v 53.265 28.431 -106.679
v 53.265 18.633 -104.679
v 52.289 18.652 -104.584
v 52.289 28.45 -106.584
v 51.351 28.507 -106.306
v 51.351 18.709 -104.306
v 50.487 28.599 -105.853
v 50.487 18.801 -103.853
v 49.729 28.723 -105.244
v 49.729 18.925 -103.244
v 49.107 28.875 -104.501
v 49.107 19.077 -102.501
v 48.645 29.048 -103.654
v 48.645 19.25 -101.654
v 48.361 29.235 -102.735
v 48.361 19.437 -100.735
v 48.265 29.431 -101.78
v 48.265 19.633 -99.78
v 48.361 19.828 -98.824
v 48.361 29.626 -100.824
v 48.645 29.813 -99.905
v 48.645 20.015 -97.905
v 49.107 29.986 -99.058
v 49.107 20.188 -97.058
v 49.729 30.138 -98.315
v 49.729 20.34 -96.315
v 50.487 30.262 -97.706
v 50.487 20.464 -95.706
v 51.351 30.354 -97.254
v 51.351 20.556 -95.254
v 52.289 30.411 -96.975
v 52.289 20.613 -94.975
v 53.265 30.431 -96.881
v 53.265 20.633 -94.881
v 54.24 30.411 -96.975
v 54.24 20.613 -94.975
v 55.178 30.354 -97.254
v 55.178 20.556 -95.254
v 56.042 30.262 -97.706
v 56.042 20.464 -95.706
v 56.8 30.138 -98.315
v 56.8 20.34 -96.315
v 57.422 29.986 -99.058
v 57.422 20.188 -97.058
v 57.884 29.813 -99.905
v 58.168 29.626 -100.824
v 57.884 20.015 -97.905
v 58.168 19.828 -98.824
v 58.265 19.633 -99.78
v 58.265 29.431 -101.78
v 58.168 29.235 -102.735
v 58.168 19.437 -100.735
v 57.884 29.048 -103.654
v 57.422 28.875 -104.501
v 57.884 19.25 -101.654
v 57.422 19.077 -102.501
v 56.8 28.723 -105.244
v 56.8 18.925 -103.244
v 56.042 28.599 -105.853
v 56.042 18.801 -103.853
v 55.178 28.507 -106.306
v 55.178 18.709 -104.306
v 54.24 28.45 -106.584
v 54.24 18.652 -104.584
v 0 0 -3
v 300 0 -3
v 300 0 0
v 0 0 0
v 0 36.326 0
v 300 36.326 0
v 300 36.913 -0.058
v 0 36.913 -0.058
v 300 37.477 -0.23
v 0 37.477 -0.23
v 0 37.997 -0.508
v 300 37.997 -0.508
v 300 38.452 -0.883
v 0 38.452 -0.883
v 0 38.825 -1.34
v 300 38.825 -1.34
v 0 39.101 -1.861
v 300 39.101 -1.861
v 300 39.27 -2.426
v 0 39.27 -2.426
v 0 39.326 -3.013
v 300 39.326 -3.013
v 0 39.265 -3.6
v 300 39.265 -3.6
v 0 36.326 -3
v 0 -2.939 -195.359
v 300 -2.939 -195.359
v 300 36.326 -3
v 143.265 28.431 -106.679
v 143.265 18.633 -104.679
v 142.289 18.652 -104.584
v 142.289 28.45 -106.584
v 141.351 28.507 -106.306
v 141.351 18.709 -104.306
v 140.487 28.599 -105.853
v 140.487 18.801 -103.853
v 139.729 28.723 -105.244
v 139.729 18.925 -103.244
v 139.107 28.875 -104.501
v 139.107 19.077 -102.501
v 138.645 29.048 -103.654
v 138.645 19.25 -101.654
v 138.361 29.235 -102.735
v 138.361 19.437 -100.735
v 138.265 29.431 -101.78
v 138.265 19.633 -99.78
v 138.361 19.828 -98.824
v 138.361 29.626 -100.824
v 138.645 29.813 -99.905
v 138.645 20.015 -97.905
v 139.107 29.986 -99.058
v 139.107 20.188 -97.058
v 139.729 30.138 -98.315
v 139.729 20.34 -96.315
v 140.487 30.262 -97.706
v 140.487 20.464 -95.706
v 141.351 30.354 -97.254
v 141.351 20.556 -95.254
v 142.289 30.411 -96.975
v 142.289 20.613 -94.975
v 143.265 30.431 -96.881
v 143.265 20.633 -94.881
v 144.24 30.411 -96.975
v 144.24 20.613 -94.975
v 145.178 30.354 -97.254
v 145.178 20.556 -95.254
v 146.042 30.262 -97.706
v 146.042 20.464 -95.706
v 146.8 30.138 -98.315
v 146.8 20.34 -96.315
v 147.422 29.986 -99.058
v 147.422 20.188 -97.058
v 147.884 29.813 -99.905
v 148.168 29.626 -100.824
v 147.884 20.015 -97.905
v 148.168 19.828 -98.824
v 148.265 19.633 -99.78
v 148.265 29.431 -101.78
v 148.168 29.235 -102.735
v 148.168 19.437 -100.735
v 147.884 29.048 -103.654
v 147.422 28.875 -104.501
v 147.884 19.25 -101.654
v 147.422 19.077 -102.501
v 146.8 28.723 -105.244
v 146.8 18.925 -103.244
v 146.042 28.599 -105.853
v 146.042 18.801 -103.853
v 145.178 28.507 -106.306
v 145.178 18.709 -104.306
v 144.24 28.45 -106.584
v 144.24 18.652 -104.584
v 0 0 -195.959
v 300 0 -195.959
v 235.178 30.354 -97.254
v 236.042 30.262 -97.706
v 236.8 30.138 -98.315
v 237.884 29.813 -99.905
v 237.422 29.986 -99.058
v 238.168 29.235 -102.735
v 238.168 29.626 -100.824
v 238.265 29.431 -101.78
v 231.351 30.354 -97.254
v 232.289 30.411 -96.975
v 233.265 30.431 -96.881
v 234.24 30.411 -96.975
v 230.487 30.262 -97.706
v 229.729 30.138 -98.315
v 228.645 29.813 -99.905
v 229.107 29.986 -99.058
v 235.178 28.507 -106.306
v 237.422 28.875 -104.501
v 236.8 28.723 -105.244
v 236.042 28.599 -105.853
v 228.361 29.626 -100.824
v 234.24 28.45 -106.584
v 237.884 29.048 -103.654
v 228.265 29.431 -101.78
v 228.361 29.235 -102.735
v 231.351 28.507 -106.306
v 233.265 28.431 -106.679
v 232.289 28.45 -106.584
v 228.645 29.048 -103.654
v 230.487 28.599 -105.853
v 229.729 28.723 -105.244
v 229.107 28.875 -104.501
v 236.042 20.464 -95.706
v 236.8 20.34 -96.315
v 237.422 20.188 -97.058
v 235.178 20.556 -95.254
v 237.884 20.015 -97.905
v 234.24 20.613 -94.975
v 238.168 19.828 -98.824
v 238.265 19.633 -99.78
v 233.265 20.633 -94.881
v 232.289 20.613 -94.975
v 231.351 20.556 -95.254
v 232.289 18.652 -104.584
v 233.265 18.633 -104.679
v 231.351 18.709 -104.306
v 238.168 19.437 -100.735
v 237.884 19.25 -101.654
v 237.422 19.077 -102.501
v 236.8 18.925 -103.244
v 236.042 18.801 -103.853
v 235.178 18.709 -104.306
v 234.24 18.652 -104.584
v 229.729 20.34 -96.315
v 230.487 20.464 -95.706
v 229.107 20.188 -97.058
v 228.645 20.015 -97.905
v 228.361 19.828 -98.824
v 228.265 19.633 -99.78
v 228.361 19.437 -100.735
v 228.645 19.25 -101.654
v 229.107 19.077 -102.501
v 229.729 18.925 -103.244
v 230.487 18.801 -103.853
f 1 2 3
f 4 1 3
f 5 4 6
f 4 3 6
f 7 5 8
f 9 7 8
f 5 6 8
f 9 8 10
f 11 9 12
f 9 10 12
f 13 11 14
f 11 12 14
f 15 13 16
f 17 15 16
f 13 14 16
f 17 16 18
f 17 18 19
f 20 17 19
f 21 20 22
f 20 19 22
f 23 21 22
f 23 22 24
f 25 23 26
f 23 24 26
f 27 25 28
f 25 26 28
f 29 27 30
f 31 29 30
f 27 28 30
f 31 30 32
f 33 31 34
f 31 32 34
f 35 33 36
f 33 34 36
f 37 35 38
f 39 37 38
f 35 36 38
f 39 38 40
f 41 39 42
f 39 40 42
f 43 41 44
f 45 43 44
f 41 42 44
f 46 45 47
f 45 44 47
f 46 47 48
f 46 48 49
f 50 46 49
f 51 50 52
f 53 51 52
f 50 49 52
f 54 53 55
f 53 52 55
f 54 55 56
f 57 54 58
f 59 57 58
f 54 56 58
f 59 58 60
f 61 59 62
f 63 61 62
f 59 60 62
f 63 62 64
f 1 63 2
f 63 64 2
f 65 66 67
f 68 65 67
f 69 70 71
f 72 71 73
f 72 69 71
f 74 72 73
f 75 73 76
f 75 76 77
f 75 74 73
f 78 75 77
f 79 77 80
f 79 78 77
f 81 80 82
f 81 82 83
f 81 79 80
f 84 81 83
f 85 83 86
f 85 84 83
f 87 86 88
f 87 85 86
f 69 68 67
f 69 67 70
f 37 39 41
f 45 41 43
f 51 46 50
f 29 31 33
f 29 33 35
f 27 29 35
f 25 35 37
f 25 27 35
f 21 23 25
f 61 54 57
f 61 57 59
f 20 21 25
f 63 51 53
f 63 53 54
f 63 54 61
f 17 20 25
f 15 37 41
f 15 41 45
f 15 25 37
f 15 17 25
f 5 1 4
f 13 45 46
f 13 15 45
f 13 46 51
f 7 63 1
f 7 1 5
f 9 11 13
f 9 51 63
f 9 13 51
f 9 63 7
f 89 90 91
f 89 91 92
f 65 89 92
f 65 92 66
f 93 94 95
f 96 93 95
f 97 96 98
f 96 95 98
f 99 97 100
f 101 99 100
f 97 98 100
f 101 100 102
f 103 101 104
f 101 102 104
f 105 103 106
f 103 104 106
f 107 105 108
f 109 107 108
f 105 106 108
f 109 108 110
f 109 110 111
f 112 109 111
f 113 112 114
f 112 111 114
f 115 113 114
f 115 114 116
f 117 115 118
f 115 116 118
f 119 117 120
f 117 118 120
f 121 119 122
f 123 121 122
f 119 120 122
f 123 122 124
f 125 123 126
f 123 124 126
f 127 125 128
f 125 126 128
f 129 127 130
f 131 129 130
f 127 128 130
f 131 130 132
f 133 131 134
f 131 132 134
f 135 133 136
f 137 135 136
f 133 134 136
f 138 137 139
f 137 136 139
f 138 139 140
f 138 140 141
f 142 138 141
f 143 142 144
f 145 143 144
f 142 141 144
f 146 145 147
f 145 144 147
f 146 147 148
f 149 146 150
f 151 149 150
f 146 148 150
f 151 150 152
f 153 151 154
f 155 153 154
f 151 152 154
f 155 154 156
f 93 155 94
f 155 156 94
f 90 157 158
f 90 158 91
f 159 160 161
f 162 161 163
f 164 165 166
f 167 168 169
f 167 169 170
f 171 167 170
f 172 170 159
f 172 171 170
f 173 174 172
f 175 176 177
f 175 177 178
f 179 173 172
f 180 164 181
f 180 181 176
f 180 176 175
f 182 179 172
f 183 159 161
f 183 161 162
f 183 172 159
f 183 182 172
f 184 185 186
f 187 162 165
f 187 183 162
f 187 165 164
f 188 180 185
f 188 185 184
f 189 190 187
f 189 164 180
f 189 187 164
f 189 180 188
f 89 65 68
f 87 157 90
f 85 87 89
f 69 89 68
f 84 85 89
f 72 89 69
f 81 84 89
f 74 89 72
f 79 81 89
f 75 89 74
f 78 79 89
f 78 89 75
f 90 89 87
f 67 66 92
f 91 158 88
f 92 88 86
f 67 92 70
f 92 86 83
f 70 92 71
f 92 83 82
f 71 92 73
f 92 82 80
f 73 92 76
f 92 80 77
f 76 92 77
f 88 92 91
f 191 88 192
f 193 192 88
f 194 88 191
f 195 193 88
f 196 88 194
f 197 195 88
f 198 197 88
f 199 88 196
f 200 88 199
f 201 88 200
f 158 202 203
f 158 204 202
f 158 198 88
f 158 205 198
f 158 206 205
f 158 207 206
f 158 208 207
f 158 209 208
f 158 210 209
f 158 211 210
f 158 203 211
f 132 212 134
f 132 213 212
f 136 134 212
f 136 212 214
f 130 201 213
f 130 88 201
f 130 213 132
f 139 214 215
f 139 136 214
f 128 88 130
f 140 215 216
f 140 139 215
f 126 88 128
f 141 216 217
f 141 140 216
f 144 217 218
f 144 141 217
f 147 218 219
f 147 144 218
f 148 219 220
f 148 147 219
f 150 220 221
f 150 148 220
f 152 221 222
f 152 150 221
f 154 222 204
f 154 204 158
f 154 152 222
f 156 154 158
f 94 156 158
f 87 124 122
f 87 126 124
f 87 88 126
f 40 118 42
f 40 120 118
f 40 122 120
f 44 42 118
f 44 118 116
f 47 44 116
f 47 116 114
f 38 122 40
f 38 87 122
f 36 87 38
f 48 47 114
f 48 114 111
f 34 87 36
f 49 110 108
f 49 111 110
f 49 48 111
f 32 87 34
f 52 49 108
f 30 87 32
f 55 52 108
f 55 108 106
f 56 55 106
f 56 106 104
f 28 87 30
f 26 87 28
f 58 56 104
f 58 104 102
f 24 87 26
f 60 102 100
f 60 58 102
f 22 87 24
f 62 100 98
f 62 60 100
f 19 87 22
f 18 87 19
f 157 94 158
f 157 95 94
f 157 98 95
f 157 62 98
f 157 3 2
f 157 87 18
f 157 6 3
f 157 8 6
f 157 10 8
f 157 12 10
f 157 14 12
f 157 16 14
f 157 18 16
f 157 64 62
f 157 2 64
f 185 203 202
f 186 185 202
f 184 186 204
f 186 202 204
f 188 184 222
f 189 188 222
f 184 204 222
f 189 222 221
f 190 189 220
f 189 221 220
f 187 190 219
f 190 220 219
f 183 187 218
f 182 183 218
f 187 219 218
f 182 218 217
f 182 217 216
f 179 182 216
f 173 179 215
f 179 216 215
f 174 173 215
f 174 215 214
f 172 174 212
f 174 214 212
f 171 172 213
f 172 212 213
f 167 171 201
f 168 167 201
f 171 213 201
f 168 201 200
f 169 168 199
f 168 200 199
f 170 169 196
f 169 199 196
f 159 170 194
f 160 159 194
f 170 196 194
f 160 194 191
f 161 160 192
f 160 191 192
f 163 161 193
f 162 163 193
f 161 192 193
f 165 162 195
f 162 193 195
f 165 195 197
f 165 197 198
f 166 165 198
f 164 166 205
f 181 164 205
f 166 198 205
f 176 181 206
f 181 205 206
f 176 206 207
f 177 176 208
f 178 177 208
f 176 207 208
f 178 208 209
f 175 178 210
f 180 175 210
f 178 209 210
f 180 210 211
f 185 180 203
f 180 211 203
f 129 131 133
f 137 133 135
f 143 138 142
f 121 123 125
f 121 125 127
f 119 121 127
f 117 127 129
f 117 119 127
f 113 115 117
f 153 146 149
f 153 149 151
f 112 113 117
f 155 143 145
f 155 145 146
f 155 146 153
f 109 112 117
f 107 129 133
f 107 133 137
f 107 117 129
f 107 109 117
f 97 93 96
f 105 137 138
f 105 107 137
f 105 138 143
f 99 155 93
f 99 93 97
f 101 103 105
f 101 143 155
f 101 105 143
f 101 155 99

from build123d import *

# Parameters (mm, degrees)
BOSS_EXTRUDE2_DEPTH = 300
SKETCH3_R           = 5
BOSS_EXTRUDE3_DEPTH = 10


with BuildPart() as part:
    # Sketch2 → Boss-Extrude2 (new body)
    with BuildSketch(Plane(origin=(0, 0, 0), x_dir=(0, 0, -1), z_dir=(1, 0, 0))):
        with BuildLine():
            Line((195.359179423, -2.939387691), (3, 36.325765386))
            Line((3, 36.325765386), (3, 0))
            Line((3, 0), (0, 0))
            Line((0, 0), (0, 36.325765386))
            ThreePointArc((0, 36.325765386), (1.102633404, 38.649555394), (3.6, 39.265153077))
            Line((3.6, 39.265153077), (195.959179423, 0))
            Line((195.959179423, 0), (195.359179423, -2.939387691))
        make_face()
    extrude(amount=BOSS_EXTRUDE2_DEPTH)

    # Sketch3 → Boss-Extrude3 (add)
    with BuildSketch(Plane(origin=(0, 38.4, -7.838367177), x_dir=(1, 0, 0), z_dir=(0, 0.9797958971132714, -0.19999999999999998))):
        with Locations(Location((53.264501209, 93.837117307, 0), (0, 0, 90))):
            Circle(SKETCH3_R)
        with Locations(Location((143.264501209, 93.837117307, 0), (0, 0, 90))):
            Circle(SKETCH3_R)
        with Locations(Location((233.264501209, 93.837117307, 0), (0, 0, 90))):
            Circle(SKETCH3_R)
    extrude(amount=BOSS_EXTRUDE3_DEPTH)


solid = part.part
